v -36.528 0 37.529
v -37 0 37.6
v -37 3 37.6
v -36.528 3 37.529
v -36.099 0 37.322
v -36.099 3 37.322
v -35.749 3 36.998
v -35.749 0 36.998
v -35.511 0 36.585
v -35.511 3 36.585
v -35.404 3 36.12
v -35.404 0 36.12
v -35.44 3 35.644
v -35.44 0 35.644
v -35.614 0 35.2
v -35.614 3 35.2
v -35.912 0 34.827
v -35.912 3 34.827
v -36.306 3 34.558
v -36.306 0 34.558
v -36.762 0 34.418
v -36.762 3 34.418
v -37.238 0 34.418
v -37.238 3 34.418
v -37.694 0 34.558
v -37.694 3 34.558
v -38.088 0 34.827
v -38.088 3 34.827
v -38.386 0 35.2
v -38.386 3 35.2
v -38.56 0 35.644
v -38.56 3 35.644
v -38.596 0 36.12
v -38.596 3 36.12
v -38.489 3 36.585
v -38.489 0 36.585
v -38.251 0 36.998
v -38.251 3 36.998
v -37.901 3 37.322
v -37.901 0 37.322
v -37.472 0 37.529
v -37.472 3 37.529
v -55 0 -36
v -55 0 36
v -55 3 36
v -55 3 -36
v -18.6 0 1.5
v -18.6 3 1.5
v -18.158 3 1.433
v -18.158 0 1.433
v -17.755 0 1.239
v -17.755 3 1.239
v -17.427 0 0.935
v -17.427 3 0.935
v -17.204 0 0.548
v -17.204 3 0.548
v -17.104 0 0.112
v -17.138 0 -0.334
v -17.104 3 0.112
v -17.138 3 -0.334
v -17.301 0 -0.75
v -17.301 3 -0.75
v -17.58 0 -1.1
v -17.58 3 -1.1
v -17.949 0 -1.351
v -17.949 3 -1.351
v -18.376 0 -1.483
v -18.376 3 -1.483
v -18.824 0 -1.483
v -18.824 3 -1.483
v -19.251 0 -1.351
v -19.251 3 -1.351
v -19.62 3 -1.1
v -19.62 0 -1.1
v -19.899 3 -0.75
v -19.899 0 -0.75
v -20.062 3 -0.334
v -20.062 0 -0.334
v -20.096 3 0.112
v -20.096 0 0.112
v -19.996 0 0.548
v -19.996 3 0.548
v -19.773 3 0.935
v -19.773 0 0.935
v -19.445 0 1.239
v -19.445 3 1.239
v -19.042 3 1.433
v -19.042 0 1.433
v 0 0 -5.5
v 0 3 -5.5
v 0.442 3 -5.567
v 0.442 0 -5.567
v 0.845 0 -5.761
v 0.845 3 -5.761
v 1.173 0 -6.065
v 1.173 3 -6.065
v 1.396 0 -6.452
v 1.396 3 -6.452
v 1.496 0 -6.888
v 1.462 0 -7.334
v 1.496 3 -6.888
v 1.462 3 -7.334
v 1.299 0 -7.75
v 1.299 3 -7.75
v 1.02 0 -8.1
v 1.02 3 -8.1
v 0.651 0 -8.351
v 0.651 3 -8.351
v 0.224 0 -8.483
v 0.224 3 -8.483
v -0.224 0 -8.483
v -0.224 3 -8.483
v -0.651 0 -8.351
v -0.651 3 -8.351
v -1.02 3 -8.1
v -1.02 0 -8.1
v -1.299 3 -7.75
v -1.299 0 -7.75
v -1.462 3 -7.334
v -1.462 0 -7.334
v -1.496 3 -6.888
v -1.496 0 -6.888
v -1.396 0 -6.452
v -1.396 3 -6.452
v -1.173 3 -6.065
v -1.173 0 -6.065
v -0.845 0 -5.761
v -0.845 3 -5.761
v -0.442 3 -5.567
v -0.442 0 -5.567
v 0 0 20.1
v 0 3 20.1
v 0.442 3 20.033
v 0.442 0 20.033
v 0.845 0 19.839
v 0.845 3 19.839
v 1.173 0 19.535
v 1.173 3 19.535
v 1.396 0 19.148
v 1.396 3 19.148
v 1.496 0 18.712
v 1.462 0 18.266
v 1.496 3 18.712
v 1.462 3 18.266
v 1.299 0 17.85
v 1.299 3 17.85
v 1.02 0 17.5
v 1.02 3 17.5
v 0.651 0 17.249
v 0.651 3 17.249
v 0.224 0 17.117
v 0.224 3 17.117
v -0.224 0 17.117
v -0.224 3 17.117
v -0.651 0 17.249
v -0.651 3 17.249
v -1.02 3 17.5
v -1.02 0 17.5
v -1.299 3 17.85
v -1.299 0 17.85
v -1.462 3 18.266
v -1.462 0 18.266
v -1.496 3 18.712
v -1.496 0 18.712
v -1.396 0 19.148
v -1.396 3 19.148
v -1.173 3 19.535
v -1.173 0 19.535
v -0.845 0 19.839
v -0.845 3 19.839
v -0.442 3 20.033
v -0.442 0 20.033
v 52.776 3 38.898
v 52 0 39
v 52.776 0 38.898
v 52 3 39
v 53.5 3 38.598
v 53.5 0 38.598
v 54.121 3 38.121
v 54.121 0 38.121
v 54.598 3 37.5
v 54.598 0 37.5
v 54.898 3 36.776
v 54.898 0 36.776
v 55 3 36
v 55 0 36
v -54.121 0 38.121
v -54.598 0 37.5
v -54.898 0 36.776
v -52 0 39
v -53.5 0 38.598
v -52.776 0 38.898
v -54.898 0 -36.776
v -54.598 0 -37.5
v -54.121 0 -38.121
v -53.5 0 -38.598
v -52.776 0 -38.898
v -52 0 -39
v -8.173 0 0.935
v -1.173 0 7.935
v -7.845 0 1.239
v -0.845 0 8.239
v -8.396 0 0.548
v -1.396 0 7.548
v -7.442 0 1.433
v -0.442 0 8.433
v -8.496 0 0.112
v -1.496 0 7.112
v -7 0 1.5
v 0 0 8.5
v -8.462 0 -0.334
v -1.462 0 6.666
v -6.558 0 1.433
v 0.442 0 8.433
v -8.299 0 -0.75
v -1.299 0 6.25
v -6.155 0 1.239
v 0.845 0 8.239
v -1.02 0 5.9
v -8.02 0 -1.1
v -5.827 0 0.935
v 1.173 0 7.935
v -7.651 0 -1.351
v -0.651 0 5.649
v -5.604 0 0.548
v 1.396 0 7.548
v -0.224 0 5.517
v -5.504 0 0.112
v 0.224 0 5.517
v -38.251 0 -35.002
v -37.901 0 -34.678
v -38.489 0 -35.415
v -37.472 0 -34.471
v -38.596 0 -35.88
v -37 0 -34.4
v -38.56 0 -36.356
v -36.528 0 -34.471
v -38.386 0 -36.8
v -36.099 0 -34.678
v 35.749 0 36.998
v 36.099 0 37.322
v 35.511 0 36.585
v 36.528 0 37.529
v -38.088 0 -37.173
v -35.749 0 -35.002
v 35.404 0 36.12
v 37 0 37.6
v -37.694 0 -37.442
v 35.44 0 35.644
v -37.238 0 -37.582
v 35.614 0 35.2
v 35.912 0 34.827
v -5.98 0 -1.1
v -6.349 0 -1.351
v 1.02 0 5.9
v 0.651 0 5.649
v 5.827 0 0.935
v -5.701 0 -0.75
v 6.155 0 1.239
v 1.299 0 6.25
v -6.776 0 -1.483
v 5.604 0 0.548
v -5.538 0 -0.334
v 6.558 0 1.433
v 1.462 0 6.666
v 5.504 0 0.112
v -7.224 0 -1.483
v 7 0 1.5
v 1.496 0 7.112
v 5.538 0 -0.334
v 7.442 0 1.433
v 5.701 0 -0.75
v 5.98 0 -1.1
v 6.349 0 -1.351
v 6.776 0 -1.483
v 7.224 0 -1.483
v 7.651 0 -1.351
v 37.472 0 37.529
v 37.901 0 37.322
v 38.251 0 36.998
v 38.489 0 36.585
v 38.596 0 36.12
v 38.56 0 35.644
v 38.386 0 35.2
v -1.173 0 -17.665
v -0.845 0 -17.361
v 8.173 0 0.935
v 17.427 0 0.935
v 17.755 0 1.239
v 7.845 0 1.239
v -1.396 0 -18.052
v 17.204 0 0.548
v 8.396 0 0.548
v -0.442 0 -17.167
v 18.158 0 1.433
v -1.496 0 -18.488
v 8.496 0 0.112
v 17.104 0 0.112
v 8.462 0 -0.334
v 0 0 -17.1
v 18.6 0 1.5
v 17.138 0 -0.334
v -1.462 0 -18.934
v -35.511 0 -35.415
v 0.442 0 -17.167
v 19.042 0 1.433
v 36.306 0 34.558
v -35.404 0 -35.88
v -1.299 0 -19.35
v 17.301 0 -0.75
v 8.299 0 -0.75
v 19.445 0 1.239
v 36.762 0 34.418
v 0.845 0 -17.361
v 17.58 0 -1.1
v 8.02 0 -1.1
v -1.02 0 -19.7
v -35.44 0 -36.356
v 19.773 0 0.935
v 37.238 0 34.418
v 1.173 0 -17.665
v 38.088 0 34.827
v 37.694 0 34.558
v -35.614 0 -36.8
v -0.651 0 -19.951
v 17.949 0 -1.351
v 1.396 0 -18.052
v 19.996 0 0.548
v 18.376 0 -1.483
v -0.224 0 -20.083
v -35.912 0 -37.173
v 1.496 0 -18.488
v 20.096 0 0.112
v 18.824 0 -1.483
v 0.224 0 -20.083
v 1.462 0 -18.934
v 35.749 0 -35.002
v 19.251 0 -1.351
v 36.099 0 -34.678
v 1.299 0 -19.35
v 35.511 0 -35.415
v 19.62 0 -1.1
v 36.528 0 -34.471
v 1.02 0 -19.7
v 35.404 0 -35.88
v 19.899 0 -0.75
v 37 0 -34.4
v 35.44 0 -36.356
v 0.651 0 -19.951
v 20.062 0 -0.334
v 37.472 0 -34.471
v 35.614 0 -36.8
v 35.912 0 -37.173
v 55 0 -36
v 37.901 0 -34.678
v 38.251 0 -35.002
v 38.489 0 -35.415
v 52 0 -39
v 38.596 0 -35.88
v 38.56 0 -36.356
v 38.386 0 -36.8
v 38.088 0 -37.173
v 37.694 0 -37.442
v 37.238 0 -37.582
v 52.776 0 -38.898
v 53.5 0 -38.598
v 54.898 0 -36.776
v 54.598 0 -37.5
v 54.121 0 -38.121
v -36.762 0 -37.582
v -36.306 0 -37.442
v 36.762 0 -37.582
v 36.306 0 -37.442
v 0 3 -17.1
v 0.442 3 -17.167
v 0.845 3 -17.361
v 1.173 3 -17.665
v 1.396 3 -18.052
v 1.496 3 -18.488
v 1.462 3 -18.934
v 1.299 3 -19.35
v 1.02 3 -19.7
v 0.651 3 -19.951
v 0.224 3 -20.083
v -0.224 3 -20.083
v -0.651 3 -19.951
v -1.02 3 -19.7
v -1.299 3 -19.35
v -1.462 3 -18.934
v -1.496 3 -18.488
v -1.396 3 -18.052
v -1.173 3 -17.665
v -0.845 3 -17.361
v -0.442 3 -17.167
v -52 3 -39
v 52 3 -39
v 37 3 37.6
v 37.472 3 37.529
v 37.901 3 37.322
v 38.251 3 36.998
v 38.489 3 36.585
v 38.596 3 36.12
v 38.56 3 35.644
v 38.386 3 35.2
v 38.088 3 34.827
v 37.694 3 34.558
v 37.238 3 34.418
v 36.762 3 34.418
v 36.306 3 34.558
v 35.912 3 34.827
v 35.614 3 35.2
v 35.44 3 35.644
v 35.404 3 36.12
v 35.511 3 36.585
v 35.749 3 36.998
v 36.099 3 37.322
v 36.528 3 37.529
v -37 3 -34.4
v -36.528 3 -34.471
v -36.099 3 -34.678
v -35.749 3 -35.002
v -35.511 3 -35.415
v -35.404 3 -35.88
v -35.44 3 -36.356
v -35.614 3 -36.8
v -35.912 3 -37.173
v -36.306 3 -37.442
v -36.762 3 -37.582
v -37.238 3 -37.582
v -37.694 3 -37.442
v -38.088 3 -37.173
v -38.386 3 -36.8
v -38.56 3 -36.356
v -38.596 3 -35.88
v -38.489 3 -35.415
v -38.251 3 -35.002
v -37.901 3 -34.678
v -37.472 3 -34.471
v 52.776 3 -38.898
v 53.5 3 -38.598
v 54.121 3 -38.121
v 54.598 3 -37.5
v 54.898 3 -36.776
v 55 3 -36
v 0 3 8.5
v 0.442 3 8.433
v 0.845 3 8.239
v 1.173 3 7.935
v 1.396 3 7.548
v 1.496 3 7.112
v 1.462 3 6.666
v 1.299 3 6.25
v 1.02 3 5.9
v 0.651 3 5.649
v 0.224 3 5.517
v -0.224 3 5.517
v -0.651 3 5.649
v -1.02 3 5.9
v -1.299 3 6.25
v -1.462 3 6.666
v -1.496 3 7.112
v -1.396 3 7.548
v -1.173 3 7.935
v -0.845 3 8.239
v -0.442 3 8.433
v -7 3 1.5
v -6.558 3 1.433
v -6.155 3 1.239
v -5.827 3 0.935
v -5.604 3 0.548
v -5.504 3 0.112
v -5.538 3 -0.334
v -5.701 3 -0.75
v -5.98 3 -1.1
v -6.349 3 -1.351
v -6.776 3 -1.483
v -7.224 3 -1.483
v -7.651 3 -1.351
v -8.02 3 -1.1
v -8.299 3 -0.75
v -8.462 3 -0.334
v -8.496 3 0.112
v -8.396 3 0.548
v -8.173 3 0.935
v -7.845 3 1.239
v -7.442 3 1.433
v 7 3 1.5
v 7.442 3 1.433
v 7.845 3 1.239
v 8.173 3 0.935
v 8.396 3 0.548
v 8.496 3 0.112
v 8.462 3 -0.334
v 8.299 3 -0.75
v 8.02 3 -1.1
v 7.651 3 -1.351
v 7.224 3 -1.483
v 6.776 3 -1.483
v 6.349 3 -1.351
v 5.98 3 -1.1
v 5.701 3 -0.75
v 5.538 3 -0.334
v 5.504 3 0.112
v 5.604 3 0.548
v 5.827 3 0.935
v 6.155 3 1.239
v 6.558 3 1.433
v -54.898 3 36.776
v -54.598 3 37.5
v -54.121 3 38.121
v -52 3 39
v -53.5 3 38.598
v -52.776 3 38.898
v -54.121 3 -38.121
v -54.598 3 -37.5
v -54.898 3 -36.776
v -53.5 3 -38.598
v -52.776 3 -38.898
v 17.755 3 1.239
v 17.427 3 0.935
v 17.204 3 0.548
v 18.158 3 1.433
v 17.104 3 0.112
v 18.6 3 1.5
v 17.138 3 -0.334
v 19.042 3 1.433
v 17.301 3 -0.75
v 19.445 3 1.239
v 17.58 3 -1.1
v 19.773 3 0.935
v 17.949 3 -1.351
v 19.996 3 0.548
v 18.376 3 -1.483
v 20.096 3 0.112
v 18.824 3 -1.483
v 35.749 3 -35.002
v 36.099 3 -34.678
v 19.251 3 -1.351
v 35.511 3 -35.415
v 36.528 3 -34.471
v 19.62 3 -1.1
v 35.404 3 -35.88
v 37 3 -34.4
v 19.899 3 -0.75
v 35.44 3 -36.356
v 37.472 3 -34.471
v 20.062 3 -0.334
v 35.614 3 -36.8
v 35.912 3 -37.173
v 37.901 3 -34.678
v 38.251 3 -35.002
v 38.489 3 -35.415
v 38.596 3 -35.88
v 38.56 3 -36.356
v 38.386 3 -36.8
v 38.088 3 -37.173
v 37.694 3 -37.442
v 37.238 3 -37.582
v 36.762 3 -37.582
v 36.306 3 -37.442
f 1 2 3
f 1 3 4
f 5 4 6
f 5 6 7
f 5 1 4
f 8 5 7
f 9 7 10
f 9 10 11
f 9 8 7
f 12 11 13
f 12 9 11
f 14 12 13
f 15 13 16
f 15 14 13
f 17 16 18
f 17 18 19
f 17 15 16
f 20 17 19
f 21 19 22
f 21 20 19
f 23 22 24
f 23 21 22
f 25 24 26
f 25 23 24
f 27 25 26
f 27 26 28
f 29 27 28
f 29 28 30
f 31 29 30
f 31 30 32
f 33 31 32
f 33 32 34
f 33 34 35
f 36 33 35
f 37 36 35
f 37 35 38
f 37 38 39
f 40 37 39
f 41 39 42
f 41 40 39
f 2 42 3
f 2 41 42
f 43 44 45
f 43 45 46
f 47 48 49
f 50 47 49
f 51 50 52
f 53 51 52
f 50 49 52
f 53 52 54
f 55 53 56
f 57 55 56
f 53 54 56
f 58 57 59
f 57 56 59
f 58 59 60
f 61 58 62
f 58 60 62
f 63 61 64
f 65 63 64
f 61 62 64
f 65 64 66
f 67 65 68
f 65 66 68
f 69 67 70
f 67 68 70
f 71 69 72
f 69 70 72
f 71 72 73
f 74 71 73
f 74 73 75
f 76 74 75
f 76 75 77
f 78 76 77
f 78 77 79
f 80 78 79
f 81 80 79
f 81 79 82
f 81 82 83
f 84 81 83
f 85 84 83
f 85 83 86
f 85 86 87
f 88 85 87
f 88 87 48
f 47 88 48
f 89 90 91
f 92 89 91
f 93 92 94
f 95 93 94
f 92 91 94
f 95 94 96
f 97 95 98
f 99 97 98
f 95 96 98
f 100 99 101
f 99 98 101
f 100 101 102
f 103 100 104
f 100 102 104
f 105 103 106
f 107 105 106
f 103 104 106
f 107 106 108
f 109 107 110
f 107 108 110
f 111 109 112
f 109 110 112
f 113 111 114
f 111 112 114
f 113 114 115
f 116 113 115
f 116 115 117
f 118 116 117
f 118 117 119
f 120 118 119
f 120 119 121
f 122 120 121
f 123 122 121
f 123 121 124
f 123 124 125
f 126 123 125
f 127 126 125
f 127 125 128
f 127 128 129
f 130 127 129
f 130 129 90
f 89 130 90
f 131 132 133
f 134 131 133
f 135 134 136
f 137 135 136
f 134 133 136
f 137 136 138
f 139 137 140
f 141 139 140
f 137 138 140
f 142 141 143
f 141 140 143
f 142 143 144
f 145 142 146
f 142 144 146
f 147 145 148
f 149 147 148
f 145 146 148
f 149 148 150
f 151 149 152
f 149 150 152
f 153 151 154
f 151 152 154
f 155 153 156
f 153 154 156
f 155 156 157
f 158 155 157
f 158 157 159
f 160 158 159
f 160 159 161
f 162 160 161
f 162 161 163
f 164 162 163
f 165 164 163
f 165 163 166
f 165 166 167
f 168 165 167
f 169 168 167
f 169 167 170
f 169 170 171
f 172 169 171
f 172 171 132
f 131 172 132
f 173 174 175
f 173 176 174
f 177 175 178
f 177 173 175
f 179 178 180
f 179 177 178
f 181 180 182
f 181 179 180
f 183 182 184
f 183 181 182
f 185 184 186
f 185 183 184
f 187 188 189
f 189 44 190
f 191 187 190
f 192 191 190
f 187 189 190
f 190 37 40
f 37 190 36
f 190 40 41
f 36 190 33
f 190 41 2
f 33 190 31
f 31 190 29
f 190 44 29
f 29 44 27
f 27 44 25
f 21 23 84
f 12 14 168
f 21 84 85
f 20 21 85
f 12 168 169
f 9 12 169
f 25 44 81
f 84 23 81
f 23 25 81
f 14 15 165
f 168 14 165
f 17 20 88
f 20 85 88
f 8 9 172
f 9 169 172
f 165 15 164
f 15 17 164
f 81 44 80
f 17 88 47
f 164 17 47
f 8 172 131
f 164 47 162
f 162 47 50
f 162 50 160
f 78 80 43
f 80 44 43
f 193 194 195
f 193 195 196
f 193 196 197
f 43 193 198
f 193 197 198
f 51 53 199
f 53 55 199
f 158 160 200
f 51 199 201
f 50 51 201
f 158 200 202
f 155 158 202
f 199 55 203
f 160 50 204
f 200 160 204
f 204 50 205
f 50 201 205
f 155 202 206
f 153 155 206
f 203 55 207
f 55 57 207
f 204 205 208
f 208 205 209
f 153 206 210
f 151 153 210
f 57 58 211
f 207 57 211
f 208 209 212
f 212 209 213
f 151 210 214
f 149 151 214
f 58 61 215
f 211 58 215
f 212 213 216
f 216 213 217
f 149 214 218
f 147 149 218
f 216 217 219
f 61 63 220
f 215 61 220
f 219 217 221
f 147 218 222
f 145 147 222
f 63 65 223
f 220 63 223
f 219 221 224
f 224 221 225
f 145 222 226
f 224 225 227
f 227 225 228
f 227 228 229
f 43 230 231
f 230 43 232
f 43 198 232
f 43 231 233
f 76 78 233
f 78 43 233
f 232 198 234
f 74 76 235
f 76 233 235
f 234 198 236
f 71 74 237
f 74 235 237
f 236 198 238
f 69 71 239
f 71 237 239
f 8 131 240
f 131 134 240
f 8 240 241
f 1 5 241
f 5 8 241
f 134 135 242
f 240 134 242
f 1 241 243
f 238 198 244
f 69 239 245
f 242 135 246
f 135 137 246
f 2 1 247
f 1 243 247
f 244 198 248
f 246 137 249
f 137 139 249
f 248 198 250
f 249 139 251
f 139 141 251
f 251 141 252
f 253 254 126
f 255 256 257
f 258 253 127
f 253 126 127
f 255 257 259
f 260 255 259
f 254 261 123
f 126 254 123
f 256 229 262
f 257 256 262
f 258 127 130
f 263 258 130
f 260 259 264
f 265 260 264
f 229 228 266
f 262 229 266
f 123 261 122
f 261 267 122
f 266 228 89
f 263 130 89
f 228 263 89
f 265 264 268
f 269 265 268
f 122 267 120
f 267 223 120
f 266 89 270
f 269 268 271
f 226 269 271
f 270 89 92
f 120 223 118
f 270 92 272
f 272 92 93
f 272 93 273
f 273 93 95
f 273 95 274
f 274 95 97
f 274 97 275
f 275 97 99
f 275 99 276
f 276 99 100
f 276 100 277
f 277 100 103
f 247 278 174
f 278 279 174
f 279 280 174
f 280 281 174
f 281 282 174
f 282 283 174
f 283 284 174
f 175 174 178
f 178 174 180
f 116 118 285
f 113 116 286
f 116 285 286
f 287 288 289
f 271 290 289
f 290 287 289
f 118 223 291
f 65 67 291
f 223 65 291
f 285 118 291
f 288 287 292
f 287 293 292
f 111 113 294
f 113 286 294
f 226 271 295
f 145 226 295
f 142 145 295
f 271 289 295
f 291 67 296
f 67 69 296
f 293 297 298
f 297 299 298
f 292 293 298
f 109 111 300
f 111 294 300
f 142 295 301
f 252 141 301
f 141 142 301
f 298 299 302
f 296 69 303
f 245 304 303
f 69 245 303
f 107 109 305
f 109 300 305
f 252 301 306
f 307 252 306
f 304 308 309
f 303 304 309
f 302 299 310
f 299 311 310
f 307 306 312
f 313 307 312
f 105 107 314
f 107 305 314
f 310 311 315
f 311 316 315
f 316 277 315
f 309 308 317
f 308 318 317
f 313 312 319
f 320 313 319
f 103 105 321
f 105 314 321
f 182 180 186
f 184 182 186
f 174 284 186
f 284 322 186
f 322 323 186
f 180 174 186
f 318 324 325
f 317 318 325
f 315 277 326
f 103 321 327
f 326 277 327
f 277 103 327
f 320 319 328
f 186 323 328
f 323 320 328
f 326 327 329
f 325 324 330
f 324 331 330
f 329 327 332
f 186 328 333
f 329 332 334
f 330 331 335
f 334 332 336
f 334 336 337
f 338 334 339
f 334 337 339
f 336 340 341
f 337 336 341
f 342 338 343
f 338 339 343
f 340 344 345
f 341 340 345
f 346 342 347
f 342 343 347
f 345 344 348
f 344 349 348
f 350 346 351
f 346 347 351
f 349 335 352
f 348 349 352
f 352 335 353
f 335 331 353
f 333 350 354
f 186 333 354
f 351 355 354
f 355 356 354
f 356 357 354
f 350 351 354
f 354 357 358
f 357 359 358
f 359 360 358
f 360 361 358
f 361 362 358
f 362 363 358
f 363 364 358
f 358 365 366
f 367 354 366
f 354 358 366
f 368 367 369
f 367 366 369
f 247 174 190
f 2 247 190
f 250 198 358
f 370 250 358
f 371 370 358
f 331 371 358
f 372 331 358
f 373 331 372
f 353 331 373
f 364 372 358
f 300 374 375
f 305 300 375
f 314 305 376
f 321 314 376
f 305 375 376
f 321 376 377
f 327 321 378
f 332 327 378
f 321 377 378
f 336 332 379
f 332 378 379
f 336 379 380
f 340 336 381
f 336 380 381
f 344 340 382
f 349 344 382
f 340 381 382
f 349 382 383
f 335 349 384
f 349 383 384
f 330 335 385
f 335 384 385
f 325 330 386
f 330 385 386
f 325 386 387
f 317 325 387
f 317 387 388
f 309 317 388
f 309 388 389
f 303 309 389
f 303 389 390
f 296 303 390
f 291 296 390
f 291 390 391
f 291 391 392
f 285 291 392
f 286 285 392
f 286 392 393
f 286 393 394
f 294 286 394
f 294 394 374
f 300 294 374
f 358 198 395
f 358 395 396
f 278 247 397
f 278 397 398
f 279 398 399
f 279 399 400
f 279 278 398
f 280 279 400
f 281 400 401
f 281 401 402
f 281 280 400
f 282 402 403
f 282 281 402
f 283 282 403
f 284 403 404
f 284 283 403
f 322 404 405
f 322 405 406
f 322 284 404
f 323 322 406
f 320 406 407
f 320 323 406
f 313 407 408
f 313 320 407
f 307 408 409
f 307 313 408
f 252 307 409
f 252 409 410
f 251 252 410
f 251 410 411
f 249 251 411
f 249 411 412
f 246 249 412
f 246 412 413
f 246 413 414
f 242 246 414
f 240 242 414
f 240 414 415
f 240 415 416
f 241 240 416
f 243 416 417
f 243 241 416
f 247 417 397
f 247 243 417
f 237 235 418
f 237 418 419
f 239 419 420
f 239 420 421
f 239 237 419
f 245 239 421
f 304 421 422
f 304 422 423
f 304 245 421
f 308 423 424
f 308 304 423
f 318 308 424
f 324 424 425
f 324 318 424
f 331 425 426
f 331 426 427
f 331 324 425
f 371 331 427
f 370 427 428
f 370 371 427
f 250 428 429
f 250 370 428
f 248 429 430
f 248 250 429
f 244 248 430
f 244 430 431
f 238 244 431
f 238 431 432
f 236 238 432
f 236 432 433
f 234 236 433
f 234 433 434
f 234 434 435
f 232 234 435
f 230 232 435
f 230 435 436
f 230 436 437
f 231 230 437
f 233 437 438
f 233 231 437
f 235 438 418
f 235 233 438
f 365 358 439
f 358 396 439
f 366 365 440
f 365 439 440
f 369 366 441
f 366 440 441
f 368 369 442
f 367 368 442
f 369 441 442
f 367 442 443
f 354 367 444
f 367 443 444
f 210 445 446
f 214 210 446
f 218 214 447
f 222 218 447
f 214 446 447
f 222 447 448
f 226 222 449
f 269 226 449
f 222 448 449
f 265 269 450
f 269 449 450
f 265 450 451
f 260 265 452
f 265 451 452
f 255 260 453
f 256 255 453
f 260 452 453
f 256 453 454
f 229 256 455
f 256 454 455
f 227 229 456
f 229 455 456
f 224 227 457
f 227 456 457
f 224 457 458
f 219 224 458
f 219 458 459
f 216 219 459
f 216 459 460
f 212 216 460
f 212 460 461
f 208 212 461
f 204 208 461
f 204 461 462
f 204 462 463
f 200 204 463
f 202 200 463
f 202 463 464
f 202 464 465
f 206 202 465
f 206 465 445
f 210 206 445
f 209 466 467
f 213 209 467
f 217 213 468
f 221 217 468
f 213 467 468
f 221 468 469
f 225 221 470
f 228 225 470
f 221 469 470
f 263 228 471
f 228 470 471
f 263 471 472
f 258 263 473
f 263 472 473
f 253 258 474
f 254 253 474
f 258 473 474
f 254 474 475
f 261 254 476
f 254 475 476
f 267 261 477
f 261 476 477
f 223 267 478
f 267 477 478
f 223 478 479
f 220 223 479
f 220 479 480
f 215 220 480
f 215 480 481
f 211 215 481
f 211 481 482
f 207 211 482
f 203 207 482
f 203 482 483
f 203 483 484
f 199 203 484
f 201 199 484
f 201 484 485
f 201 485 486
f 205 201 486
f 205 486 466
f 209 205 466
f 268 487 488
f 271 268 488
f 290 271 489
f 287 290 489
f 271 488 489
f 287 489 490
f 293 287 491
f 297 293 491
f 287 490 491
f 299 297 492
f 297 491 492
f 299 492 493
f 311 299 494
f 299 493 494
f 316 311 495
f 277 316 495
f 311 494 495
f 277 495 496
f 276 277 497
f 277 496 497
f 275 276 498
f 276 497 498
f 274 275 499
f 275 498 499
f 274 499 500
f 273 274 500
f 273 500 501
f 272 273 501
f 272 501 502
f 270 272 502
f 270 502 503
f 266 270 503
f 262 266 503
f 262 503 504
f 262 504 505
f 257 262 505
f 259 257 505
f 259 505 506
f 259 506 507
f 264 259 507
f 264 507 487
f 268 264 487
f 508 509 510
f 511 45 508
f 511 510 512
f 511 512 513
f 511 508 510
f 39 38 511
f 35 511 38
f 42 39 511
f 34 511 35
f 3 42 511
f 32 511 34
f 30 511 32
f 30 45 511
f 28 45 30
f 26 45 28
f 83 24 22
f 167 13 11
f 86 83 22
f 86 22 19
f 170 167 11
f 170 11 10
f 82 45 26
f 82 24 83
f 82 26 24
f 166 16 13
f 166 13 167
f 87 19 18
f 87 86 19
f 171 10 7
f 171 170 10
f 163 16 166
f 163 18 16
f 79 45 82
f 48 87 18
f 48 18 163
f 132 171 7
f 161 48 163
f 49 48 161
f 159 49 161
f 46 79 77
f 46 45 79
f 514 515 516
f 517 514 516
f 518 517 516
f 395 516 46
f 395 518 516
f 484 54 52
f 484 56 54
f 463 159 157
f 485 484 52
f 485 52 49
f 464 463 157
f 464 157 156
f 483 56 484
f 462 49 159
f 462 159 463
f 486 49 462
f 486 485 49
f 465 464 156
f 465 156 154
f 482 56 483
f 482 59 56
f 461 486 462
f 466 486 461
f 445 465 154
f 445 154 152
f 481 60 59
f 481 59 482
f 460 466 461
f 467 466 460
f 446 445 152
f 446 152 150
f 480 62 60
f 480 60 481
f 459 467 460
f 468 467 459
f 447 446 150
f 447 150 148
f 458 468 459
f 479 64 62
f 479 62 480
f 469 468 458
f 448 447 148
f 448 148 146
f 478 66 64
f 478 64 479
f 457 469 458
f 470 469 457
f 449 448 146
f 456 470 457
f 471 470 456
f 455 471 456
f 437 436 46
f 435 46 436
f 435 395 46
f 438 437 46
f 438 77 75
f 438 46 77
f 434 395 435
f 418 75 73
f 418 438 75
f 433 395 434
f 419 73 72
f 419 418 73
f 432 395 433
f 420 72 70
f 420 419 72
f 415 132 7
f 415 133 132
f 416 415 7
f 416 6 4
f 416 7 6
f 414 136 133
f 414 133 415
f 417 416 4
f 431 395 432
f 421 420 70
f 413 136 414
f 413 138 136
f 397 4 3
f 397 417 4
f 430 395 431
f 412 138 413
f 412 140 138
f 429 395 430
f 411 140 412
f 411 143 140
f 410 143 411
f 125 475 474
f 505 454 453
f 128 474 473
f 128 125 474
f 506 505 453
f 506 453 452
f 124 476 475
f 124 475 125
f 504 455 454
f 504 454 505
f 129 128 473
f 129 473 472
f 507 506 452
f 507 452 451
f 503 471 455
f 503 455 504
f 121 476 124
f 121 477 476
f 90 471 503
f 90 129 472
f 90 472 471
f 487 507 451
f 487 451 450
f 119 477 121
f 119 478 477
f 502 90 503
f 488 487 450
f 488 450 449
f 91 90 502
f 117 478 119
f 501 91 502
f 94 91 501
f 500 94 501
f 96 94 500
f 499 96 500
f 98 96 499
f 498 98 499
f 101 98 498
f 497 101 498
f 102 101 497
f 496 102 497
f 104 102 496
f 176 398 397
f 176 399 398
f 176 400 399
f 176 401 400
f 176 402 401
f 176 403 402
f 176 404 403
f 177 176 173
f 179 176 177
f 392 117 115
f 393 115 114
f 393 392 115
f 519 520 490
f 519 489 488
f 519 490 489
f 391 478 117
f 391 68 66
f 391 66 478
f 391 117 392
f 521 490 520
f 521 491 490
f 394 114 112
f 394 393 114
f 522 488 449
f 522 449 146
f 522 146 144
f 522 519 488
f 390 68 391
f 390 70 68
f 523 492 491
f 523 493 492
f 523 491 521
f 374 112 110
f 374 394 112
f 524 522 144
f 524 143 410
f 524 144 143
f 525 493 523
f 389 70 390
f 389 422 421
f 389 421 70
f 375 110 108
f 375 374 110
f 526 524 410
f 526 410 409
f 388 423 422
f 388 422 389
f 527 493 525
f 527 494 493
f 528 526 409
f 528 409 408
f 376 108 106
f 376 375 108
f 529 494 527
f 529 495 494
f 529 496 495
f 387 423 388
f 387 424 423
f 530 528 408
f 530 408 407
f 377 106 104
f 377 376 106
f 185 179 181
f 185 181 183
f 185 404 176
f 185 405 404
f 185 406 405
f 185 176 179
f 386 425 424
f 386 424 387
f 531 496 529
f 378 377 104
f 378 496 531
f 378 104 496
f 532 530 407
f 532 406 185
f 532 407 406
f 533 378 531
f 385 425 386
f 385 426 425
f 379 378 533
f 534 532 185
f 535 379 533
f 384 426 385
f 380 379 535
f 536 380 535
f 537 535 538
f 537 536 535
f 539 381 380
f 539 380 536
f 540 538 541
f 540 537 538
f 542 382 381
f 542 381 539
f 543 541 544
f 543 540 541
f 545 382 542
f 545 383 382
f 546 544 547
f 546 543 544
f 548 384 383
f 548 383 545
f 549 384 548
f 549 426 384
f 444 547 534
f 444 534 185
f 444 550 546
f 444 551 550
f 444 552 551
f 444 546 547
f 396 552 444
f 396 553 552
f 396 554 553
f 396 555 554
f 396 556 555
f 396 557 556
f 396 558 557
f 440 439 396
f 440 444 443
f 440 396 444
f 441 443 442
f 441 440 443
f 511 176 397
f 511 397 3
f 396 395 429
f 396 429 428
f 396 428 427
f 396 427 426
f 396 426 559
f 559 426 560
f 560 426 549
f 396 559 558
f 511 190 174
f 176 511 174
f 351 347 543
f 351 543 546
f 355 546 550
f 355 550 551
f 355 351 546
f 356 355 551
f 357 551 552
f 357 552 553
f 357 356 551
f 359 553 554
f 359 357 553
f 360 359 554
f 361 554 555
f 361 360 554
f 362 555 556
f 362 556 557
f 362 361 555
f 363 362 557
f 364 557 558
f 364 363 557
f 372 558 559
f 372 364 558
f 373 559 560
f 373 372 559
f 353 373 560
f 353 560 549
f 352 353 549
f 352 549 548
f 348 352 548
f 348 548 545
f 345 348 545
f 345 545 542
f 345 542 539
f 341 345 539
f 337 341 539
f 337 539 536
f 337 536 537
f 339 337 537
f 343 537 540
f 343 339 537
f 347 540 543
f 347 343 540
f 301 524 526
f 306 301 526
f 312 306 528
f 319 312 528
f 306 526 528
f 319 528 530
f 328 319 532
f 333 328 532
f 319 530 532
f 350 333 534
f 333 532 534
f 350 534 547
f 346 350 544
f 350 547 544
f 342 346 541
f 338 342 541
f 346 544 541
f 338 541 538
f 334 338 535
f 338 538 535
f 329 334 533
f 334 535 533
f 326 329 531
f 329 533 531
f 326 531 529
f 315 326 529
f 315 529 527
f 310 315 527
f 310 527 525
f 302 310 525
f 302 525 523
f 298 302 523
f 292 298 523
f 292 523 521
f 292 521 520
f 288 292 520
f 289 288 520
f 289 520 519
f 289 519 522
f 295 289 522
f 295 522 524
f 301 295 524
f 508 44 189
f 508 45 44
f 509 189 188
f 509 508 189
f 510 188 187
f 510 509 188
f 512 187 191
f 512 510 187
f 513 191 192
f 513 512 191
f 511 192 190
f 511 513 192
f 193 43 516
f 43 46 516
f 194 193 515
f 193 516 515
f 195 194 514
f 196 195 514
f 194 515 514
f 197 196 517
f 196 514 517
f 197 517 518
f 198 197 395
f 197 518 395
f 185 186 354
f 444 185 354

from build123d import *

# Parameters (mm, degrees)
SKETCH_1_W          = 110
SKETCH_1_H          = 78
SKETCH_1_R          = 1.6
EXTRUDE_1_DEPTH     = 3
FILLET_1_R          = 3
SKETCH_2_R          = 1.5
CUT_EXTRUDE_1_DEPTH = 10


with BuildPart() as part:
    # 草图1 → 凸台-拉伸1 (new body)
    with BuildSketch(Plane(origin=(0, 0, 0), x_dir=(1, 0, 0), z_dir=(0, 1, 0))):
        Rectangle(SKETCH_1_W, SKETCH_1_H)
        with Locations(Location((-37, 36, 0), (0, 0, 270))):
            Circle(SKETCH_1_R, mode=Mode.SUBTRACT)
        with Locations(Location((37, 36, 0), (0, 0, 270))):
            Circle(SKETCH_1_R, mode=Mode.SUBTRACT)
        with Locations(Location((37, -36, 0), (0, 0, 270))):
            Circle(SKETCH_1_R, mode=Mode.SUBTRACT)
        with Locations(Location((-37, -36, 0), (0, 0, 270))):
            Circle(SKETCH_1_R, mode=Mode.SUBTRACT)
    extrude(amount=EXTRUDE_1_DEPTH)

    # 圆角1
    fillet_1_edges = [part.edges().sort_by_distance(p)[0] for p in [
        (-55, 1.5, -39),
        (55, 1.5, -39),
        (55, 1.5, 39),
        (-55, 1.5, 39),
    ]]
    fillet(fillet_1_edges, radius=FILLET_1_R)

    # 草图2 → 切除-拉伸1 (cut)
    with BuildSketch(Plane(origin=(0, 3, 0), x_dir=(1, 0, 0), z_dir=(0, 1, 0))):
        with Locations(Location((0, 7, 0), (0, 0, 270))):
            Circle(SKETCH_2_R)
        with Locations(Location((7, 0, 0), (0, 0, 270))):
            Circle(SKETCH_2_R)
        with Locations(Location((0, -7, 0), (0, 0, 270))):
            Circle(SKETCH_2_R)
        with Locations(Location((-7, 0, 0), (0, 0, 270))):
            Circle(SKETCH_2_R)
        with Locations(Location((18.6, 0, 0), (0, 0, 270))):
            Circle(SKETCH_2_R)
        with Locations(Location((-18.6, 0, 0), (0, 0, 270))):
            Circle(SKETCH_2_R)
        with Locations(Location((0, 18.6, 0), (0, 0, 270))):
            Circle(SKETCH_2_R)
        with Locations(Location((0, -18.6, 0), (0, 0, 270))):
            Circle(SKETCH_2_R)
    extrude(amount=-CUT_EXTRUDE_1_DEPTH, mode=Mode.SUBTRACT)


solid = part.part
